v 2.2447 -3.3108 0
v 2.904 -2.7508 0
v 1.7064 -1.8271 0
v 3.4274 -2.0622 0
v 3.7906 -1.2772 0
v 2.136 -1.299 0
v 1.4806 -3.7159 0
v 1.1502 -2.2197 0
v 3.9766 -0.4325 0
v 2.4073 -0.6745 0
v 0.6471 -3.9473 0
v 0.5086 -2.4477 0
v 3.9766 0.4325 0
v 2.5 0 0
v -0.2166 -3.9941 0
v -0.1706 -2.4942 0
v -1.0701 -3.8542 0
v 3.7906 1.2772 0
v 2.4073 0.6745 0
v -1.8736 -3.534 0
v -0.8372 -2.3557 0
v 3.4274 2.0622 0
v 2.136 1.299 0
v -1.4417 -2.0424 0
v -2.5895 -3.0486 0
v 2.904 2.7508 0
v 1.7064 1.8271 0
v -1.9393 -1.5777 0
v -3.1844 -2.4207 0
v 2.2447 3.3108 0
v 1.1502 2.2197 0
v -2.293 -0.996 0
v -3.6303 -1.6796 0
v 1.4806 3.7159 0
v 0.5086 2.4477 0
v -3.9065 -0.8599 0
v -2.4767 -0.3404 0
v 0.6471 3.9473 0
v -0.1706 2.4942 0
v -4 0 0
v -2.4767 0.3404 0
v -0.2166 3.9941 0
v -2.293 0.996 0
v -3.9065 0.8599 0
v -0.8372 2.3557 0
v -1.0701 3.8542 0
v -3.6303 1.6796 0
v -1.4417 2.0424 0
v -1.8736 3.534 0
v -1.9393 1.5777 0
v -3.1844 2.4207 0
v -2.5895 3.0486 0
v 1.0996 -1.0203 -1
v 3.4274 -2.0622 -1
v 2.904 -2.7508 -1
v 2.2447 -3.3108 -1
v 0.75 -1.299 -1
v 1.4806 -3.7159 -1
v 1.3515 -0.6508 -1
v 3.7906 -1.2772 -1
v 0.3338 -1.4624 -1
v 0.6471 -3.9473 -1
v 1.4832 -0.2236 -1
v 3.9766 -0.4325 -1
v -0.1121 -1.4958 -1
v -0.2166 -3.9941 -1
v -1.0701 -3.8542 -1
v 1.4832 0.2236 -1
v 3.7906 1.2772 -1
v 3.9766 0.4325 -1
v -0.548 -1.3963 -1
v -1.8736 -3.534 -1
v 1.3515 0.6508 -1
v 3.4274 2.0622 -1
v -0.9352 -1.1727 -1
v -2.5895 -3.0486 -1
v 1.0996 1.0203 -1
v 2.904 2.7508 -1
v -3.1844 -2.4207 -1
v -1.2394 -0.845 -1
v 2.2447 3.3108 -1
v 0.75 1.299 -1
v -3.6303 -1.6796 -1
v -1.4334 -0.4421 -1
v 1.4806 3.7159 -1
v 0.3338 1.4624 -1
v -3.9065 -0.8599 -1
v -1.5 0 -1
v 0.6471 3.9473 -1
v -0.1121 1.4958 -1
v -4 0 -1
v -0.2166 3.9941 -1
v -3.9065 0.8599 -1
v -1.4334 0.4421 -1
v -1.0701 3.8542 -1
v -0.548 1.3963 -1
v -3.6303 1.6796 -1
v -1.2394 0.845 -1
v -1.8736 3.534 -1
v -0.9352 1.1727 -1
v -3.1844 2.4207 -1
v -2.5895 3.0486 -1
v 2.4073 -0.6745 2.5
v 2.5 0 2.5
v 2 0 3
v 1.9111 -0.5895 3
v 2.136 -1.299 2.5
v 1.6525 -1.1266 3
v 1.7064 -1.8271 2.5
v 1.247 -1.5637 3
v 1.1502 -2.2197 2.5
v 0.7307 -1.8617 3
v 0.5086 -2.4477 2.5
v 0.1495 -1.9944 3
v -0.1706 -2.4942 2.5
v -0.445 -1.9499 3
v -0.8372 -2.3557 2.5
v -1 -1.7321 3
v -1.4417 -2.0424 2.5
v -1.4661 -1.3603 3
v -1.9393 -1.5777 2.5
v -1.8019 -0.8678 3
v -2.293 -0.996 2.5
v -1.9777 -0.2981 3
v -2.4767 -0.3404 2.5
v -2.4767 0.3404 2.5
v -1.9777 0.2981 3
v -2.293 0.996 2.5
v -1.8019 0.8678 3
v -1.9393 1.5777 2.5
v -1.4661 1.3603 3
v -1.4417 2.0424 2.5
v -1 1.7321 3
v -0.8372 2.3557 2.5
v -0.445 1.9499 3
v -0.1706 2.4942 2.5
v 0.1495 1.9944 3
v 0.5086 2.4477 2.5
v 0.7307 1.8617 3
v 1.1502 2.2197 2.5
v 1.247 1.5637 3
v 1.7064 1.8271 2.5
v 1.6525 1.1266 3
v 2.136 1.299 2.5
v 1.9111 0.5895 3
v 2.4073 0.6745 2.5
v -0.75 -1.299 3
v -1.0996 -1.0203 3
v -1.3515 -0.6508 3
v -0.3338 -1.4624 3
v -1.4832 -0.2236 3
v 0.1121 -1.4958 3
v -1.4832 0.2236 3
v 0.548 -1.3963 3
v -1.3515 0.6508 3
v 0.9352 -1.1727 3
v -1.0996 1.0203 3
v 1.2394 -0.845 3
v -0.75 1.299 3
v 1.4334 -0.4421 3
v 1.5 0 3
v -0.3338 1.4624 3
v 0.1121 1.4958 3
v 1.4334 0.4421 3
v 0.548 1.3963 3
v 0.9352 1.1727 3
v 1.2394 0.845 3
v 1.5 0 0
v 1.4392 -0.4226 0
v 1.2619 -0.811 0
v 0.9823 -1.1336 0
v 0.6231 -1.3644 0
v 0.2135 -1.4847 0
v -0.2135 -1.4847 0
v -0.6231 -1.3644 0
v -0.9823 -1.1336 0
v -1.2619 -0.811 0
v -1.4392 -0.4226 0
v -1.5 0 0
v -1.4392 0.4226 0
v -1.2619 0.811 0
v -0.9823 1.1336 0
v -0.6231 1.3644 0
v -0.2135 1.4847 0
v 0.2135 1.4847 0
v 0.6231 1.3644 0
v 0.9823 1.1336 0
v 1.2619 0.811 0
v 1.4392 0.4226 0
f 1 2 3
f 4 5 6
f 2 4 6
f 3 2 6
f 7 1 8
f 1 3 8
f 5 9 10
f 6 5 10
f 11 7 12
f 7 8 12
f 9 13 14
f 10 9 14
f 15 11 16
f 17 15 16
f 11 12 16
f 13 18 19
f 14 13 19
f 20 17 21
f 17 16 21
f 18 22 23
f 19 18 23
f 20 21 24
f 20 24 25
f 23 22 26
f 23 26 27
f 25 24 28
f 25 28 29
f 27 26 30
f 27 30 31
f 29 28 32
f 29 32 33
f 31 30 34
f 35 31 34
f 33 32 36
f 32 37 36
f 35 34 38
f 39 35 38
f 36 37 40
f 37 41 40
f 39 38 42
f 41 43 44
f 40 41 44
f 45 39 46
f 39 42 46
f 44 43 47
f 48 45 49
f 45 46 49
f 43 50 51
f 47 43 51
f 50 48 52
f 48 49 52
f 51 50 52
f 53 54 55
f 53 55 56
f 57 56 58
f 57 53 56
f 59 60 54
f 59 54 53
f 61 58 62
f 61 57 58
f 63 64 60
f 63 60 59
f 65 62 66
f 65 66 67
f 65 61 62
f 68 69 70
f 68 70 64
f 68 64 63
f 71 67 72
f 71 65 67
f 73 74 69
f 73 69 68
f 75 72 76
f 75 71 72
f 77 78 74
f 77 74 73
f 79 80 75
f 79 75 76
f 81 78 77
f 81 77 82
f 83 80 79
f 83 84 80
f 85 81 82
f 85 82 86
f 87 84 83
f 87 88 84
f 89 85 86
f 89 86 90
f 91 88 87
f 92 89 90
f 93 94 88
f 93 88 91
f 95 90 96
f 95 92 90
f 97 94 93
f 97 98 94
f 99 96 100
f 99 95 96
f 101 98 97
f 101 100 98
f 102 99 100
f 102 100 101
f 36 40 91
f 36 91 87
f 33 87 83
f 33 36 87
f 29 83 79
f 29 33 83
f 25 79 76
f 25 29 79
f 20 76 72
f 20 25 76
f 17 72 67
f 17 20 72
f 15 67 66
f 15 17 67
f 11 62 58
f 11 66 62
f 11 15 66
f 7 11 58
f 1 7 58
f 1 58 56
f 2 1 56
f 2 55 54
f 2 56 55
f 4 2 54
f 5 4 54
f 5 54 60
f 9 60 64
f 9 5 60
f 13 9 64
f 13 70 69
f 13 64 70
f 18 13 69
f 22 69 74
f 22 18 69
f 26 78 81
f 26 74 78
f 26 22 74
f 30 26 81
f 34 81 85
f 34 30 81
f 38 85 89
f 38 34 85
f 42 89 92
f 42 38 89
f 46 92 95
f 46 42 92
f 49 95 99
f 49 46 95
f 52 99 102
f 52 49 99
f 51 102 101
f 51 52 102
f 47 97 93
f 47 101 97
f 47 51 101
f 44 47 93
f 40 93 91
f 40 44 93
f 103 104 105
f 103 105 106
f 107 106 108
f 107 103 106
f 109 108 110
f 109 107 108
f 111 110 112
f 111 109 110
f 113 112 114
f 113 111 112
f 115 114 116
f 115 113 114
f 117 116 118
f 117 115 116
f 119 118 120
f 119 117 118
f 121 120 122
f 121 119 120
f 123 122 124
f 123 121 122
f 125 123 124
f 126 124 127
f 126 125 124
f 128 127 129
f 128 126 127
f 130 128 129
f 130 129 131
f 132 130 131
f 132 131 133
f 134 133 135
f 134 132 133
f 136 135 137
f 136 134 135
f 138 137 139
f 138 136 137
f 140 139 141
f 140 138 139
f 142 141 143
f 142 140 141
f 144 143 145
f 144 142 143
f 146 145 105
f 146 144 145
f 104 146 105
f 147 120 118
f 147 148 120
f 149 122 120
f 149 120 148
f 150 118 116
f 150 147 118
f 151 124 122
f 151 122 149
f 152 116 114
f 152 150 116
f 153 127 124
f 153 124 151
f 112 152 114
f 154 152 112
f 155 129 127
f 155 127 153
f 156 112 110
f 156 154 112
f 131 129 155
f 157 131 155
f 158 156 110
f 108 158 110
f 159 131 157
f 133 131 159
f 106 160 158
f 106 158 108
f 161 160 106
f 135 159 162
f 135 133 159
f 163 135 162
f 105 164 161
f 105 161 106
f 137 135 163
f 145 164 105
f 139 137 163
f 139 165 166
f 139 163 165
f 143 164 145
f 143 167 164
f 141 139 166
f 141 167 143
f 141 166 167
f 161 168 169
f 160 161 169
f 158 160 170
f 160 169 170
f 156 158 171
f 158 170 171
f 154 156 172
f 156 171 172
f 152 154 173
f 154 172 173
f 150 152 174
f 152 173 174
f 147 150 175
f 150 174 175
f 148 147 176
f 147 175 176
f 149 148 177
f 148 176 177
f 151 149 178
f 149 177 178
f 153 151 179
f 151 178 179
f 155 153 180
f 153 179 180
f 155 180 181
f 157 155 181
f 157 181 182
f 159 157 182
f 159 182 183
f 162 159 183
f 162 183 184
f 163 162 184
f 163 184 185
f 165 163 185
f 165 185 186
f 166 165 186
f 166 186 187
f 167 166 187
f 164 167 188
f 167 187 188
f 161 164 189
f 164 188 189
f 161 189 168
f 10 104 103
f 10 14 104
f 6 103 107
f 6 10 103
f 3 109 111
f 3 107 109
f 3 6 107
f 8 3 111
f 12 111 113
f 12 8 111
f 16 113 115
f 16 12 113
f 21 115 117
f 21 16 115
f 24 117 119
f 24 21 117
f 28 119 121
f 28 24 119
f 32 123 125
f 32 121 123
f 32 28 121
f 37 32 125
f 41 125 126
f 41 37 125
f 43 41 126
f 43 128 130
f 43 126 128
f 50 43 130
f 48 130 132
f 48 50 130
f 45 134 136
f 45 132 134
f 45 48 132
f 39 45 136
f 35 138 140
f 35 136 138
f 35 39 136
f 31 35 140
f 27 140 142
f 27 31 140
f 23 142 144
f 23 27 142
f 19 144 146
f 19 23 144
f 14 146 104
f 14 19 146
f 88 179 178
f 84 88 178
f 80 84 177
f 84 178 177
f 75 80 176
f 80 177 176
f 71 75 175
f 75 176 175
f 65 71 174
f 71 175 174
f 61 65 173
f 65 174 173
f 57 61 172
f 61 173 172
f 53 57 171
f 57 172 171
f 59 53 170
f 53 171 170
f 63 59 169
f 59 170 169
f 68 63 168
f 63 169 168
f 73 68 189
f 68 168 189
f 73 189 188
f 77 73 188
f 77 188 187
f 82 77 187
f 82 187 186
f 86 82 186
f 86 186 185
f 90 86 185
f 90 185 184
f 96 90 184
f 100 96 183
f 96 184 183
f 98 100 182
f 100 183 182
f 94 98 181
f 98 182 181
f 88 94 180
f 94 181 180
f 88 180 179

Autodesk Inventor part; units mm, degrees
ref_plane "YZ Plane" through (0, 0, 0) normal (1, 0, 0) x (0, 1, 0)
ref_plane "XZ Plane" through (0, 0, 0) normal (0, 1, 0) x (-1, 0, 0)
ref_plane "XY Plane" through (0, 0, 0) normal (0, 0, 1) x (1, 0, 0)
sketch "スケッチ1" plane through (0, 0, 0) normal (0, 0, 1) x (1, 0, 0)
  circle A0 centre (0, 0) radius 1.5
  circle A1 centre (0, 0) radius 2.5
  dimension "d0" = 3
  dimension "d1" = 5
extrude "押し出し1" add sketch "スケッチ1" along normal blind 3
chamfer "面取り1" distance 0.5 angle 45 1 edges at (-2.5, 0, 3)
sketch "スケッチ2" plane through (0, 0, 0) normal (0, 0, -1) x (-1, 0, 0)
  circle A0 centre (0, 0) radius 1.5 projected
  circle A1 centre (0, 0) radius 4
  dimension "d7" = 8
extrude "押し出し2" add sketch "スケッチ2" along normal blind 1
properties part number "オイレスw3f3-5a" material "アセタール樹脂、黒"
